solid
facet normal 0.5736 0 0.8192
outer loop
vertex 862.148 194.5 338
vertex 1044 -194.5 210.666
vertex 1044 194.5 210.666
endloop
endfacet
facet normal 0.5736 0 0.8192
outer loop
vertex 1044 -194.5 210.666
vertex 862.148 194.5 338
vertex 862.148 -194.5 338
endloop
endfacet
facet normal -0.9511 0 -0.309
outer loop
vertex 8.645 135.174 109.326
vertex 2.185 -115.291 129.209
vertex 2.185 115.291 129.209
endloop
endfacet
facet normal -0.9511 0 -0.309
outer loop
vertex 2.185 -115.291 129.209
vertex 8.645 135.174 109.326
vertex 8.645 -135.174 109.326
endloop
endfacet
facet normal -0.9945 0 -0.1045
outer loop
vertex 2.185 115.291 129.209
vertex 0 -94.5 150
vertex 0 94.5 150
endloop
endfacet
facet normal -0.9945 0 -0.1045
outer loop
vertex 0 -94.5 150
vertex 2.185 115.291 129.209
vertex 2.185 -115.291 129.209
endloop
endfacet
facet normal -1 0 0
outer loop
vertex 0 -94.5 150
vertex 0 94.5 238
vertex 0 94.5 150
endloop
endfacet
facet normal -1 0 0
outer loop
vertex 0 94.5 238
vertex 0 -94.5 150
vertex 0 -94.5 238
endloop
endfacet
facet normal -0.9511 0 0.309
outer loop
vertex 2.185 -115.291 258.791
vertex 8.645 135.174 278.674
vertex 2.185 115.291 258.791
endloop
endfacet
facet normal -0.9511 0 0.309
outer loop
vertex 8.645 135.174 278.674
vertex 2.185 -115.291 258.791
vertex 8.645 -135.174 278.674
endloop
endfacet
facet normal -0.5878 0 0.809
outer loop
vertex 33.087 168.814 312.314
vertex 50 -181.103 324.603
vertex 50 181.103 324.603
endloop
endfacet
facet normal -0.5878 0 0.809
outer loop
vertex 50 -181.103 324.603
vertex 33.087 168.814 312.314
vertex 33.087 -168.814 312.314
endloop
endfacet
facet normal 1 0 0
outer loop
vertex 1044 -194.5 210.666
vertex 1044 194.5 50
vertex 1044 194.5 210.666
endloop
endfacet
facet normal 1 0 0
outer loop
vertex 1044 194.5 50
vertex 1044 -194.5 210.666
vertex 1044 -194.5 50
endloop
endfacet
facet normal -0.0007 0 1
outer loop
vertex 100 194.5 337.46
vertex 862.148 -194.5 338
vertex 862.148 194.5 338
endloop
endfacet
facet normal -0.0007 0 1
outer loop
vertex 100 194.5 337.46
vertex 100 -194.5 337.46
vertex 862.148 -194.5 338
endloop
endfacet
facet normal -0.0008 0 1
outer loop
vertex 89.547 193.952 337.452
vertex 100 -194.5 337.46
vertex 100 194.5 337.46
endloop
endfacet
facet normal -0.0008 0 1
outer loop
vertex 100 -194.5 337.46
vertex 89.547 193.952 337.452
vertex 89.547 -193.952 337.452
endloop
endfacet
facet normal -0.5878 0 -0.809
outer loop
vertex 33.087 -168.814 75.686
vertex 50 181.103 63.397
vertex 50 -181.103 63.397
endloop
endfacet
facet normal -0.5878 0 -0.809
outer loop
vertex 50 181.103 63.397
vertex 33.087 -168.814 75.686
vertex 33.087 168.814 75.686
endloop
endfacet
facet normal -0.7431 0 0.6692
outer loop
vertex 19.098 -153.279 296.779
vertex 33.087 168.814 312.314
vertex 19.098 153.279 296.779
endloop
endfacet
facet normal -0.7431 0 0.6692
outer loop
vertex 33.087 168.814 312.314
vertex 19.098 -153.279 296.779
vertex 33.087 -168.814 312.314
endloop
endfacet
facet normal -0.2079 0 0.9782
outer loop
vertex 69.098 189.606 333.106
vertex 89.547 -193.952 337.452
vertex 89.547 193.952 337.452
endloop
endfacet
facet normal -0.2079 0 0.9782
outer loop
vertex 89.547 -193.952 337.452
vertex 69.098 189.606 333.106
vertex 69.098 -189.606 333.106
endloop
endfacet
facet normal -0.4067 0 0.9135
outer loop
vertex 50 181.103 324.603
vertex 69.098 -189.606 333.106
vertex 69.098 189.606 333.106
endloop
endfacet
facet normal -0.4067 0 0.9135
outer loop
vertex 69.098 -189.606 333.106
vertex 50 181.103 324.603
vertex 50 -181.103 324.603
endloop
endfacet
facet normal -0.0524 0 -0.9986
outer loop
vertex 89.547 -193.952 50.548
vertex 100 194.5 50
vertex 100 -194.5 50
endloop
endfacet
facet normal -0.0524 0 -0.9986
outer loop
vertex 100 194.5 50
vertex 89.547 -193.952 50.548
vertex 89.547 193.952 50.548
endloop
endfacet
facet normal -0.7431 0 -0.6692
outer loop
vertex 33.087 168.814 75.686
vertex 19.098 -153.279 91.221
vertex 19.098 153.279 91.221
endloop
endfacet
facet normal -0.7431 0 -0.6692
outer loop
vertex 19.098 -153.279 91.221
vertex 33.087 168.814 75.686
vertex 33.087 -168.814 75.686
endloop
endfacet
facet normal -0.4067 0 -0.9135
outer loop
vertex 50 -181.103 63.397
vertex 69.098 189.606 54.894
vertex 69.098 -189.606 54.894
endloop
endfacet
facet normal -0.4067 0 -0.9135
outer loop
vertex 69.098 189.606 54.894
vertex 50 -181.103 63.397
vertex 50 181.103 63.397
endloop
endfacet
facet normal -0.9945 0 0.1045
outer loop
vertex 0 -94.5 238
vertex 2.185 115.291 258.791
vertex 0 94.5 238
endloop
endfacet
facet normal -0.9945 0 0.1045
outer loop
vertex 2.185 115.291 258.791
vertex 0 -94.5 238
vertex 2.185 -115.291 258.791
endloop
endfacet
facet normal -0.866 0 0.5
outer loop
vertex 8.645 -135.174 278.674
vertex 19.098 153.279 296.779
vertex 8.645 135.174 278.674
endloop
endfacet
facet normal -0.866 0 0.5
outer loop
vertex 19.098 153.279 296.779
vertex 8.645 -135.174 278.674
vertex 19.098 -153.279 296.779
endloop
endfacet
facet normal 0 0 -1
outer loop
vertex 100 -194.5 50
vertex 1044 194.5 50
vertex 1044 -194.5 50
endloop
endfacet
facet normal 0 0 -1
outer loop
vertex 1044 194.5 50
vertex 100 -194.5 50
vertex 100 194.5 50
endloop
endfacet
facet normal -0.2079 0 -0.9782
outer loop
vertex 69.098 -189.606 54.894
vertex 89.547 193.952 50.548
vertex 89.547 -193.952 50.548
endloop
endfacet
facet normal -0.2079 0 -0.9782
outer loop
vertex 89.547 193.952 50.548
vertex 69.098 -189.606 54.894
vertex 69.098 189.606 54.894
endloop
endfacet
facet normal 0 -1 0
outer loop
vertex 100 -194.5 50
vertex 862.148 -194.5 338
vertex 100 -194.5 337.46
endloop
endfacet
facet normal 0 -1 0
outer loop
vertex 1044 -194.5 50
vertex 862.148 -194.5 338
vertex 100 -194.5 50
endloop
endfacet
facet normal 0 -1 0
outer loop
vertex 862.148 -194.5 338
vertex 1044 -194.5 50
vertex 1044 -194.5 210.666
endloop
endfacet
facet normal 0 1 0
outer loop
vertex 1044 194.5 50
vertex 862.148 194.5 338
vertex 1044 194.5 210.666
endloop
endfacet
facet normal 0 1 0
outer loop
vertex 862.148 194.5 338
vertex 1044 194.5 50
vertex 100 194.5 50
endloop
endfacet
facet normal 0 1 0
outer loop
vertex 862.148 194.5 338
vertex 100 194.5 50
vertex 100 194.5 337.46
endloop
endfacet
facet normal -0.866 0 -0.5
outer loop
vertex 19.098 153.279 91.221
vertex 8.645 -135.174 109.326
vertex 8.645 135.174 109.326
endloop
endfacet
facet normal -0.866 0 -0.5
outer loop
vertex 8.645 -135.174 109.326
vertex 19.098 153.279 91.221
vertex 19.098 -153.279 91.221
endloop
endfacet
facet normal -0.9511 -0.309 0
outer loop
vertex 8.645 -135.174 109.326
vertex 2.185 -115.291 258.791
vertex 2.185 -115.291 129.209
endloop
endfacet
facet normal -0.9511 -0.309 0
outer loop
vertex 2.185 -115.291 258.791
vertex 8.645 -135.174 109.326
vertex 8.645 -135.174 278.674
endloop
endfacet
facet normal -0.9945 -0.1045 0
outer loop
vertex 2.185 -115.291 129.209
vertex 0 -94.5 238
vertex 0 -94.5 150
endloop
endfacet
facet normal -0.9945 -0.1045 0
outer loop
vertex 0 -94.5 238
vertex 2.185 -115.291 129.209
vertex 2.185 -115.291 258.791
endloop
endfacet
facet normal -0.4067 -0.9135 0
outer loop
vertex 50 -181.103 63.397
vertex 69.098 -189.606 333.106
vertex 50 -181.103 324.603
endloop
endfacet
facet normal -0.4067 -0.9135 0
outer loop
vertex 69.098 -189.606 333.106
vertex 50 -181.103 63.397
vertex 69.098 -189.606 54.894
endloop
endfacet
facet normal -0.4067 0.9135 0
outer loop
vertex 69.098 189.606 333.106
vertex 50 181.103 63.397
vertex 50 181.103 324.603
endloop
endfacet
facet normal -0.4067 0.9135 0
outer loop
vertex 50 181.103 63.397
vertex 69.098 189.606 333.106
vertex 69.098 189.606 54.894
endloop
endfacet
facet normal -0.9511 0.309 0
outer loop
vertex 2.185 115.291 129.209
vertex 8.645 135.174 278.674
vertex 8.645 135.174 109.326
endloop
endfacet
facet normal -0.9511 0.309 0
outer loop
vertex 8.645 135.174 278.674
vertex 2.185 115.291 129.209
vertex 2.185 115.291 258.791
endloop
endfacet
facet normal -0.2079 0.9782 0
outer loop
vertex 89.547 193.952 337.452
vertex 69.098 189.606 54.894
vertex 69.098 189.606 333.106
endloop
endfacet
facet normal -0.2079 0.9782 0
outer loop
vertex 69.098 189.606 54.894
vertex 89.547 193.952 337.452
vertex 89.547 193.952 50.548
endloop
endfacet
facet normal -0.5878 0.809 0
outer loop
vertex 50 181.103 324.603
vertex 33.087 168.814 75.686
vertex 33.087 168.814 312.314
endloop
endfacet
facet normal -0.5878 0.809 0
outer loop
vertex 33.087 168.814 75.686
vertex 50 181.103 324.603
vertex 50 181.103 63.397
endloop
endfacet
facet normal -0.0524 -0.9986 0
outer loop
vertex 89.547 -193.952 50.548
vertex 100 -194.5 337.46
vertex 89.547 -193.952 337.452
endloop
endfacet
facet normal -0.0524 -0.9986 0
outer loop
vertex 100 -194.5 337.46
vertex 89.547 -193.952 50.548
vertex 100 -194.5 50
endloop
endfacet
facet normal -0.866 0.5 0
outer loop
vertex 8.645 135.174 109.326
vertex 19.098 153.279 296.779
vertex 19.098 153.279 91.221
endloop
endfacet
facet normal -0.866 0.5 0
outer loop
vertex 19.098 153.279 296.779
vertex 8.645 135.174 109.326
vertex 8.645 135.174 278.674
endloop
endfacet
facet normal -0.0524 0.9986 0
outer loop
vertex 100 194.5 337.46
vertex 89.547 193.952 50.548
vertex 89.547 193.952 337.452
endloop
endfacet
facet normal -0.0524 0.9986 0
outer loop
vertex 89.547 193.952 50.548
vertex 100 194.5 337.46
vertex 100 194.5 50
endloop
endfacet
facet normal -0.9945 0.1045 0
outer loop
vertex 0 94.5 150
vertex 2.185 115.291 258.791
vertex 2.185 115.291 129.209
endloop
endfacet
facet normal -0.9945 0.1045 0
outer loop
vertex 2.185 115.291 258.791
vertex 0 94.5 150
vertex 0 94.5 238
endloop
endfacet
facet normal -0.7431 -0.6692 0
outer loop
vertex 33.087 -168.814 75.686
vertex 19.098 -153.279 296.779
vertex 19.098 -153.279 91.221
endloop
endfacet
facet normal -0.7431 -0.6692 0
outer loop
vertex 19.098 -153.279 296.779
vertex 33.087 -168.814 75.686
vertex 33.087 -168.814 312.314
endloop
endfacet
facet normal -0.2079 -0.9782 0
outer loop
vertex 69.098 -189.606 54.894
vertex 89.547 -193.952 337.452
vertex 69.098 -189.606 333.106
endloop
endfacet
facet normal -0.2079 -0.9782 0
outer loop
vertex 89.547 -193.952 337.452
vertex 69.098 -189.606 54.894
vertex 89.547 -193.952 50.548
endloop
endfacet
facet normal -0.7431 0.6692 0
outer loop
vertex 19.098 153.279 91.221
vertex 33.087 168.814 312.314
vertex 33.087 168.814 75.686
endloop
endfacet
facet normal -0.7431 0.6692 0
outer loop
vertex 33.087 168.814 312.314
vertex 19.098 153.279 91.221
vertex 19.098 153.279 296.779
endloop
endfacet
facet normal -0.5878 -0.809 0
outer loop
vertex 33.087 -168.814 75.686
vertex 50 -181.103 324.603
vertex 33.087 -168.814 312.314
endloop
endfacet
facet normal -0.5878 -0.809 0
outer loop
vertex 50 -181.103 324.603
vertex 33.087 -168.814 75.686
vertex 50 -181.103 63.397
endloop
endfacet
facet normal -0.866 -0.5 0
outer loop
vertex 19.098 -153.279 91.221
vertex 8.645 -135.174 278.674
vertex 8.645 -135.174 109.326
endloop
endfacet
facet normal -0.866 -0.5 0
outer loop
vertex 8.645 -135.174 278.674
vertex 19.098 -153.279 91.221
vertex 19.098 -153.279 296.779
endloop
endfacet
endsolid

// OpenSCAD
// file: ahmed-25.scad
// Ahmed et al. (1984) body in millimetres. x runs from the nose to the tail,
// y is centred on the symmetry plane and the underside sits `lift` above z = 0,
// the floor the stilts stand on. The rear slant length is measured along the slant.
// Resolution comes from the command line: openscad -D '$fn=96'.

module ahmed_body(slant_deg = 25, lift = 50) {
    length = 1044;
    width = 389;
    height = 288;
    slant_length = 222;
    front_radius = 100;
    slant_dx = slant_length * cos(slant_deg);
    slant_dz = slant_length * sin(slant_deg);

    translate([0, 0, lift])
        intersection() {
            // Side view: round the top and bottom front edges and cut the rear slant.
            rotate([90, 0, 0])
                linear_extrude(height = width, center = true)
                    hull() {
                        for (z = [front_radius, height - front_radius])
                            translate([front_radius, z])
                                circle(r = front_radius);
                        polygon([
                            [front_radius, 0],
                            [length, 0],
                            [length, height - slant_dz],
                            [length - slant_dx, height],
                            [front_radius, height - front_radius]
                        ]);
                    }
            // Plan view: round the two vertical front edges.
            linear_extrude(height = height)
                hull() {
                    for (side = [-1, 1])
                        translate([front_radius, side * (width / 2 - front_radius)])
                            circle(r = front_radius);
                    translate([front_radius, -width / 2])
                        square([length - front_radius, width]);
                }
        }
}

ahmed_body();
// main file
// The Ahmed body with the steeper 35 degree rear slant.
use <ahmed-25.scad>

ahmed_body(slant_deg = 35);
